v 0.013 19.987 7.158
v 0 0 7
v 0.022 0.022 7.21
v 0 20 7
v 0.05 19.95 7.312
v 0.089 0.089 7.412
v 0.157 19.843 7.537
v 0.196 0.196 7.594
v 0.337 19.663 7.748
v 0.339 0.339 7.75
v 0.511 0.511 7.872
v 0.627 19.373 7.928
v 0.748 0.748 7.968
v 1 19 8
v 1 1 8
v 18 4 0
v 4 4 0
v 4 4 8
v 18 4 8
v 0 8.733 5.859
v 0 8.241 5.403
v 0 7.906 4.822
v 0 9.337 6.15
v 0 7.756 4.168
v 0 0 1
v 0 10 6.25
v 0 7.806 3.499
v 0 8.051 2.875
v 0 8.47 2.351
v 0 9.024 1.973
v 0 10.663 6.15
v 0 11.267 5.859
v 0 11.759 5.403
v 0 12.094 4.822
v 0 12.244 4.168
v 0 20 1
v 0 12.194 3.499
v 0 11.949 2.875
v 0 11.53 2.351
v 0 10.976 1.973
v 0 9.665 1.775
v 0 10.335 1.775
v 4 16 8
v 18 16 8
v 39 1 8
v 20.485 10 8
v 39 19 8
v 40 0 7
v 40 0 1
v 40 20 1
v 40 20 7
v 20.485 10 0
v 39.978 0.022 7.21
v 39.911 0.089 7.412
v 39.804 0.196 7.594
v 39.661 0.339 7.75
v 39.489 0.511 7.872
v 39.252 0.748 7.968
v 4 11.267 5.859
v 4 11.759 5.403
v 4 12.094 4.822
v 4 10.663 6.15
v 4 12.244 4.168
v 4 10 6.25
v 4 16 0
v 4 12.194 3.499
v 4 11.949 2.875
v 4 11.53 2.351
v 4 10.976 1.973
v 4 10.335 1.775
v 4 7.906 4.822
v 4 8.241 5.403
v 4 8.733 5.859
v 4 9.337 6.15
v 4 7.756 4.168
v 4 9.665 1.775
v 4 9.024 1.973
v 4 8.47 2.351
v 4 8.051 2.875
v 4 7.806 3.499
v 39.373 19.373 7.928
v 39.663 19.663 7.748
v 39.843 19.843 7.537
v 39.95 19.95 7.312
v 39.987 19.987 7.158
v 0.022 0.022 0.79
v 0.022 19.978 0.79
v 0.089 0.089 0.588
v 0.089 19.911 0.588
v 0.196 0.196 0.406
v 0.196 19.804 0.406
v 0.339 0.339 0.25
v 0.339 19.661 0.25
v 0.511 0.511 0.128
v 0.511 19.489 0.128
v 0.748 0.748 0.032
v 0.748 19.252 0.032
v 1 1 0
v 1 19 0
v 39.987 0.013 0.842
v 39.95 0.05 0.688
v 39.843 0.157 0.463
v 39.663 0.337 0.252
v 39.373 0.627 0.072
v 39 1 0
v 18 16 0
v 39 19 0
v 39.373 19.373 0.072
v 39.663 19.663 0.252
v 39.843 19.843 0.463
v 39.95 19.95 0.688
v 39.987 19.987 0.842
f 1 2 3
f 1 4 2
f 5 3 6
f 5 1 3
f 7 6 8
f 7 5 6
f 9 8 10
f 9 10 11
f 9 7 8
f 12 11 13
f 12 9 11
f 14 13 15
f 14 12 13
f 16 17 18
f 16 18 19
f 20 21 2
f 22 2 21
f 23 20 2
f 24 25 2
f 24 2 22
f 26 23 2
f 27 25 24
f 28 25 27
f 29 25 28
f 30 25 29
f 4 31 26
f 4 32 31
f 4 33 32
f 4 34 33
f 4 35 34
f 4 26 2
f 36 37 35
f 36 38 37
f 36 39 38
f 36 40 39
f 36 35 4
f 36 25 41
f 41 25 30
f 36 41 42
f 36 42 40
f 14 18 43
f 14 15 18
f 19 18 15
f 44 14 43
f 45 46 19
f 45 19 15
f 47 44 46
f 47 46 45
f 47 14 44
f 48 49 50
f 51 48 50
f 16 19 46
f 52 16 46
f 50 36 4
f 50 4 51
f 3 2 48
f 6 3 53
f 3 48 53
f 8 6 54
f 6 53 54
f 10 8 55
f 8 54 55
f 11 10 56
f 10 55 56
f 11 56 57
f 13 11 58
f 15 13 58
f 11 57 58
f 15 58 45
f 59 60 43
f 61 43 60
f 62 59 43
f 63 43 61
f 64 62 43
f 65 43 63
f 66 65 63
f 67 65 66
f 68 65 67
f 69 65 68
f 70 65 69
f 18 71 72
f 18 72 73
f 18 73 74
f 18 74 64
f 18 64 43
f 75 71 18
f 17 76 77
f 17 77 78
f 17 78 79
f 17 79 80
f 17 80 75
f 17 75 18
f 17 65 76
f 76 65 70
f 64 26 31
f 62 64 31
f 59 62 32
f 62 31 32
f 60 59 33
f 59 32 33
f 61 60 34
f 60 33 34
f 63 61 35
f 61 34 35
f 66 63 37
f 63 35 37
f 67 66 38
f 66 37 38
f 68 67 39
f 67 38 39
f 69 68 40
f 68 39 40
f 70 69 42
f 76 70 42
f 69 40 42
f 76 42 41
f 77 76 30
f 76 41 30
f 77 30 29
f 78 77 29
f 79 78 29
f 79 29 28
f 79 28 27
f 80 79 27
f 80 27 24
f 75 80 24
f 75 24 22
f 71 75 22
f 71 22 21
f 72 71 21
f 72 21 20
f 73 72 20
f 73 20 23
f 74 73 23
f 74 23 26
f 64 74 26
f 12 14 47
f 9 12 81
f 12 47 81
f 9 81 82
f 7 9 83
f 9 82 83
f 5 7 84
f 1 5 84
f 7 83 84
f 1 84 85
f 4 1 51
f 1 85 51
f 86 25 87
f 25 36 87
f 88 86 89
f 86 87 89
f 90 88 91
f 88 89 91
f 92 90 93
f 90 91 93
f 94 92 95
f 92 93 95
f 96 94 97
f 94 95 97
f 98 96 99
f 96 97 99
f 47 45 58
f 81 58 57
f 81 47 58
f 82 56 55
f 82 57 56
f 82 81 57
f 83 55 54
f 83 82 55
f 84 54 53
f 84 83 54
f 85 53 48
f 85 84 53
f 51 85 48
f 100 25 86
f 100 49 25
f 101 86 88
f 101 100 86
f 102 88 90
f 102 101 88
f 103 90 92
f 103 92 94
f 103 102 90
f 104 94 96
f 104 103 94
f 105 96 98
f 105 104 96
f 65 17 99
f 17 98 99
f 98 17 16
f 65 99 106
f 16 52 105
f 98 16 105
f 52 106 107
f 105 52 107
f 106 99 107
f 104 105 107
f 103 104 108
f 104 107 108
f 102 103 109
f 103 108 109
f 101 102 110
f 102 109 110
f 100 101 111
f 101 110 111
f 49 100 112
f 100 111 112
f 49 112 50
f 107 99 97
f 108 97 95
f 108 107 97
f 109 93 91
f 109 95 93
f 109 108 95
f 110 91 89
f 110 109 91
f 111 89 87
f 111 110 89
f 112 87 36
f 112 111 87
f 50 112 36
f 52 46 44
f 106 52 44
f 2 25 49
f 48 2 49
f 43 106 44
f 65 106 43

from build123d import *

# Parameters (mm, degrees)
SKICA1_W                 = 40
SKICA1_H                 = 20
P_IDAT_VYSUNUT_M1_DEPTH  = 8
SKICA2_R                 = 2.25
ODEBRAT_VYSUNUT_M1_DEPTH = 8
ZAOBLIT2_R               = 1
ZAOBLIT3_R               = 1


with BuildPart() as part:
    # Skica1 → Přidat vysunutím1 (new body)
    with BuildSketch(Plane.XY):
        with Locations((20, 10)):
            Rectangle(SKICA1_W, SKICA1_H)
        Polygon((4, 16), (4, 4), (18, 4), (20.485281374, 10), (18, 16), align=None, mode=Mode.SUBTRACT)
    extrude(amount=P_IDAT_VYSUNUT_M1_DEPTH)

    # Skica2 → Odebrat vysunutím1 (cut)
    with BuildSketch(Plane.ZY):
        with Locations((4, 10)):
            Circle(SKICA2_R)
    extrude(amount=-ODEBRAT_VYSUNUT_M1_DEPTH, mode=Mode.SUBTRACT)

    # Zaoblit2
    zaoblit2_edges = [part.edges().sort_by_distance(p)[0] for p in [
        (20, 20, 8),
        (0, 10, 8),
        (20, 0, 8),
        (40, 10, 8),
    ]]
    fillet(zaoblit2_edges, radius=ZAOBLIT2_R)

    # Zaoblit3
    zaoblit3_edges = [part.edges().sort_by_distance(p)[0] for p in [
        (0, 10, 0),
        (20, 20, 0),
        (40, 10, 0),
        (20, 0, 0),
    ]]
    fillet(zaoblit3_edges, radius=ZAOBLIT3_R)


solid = part.part
